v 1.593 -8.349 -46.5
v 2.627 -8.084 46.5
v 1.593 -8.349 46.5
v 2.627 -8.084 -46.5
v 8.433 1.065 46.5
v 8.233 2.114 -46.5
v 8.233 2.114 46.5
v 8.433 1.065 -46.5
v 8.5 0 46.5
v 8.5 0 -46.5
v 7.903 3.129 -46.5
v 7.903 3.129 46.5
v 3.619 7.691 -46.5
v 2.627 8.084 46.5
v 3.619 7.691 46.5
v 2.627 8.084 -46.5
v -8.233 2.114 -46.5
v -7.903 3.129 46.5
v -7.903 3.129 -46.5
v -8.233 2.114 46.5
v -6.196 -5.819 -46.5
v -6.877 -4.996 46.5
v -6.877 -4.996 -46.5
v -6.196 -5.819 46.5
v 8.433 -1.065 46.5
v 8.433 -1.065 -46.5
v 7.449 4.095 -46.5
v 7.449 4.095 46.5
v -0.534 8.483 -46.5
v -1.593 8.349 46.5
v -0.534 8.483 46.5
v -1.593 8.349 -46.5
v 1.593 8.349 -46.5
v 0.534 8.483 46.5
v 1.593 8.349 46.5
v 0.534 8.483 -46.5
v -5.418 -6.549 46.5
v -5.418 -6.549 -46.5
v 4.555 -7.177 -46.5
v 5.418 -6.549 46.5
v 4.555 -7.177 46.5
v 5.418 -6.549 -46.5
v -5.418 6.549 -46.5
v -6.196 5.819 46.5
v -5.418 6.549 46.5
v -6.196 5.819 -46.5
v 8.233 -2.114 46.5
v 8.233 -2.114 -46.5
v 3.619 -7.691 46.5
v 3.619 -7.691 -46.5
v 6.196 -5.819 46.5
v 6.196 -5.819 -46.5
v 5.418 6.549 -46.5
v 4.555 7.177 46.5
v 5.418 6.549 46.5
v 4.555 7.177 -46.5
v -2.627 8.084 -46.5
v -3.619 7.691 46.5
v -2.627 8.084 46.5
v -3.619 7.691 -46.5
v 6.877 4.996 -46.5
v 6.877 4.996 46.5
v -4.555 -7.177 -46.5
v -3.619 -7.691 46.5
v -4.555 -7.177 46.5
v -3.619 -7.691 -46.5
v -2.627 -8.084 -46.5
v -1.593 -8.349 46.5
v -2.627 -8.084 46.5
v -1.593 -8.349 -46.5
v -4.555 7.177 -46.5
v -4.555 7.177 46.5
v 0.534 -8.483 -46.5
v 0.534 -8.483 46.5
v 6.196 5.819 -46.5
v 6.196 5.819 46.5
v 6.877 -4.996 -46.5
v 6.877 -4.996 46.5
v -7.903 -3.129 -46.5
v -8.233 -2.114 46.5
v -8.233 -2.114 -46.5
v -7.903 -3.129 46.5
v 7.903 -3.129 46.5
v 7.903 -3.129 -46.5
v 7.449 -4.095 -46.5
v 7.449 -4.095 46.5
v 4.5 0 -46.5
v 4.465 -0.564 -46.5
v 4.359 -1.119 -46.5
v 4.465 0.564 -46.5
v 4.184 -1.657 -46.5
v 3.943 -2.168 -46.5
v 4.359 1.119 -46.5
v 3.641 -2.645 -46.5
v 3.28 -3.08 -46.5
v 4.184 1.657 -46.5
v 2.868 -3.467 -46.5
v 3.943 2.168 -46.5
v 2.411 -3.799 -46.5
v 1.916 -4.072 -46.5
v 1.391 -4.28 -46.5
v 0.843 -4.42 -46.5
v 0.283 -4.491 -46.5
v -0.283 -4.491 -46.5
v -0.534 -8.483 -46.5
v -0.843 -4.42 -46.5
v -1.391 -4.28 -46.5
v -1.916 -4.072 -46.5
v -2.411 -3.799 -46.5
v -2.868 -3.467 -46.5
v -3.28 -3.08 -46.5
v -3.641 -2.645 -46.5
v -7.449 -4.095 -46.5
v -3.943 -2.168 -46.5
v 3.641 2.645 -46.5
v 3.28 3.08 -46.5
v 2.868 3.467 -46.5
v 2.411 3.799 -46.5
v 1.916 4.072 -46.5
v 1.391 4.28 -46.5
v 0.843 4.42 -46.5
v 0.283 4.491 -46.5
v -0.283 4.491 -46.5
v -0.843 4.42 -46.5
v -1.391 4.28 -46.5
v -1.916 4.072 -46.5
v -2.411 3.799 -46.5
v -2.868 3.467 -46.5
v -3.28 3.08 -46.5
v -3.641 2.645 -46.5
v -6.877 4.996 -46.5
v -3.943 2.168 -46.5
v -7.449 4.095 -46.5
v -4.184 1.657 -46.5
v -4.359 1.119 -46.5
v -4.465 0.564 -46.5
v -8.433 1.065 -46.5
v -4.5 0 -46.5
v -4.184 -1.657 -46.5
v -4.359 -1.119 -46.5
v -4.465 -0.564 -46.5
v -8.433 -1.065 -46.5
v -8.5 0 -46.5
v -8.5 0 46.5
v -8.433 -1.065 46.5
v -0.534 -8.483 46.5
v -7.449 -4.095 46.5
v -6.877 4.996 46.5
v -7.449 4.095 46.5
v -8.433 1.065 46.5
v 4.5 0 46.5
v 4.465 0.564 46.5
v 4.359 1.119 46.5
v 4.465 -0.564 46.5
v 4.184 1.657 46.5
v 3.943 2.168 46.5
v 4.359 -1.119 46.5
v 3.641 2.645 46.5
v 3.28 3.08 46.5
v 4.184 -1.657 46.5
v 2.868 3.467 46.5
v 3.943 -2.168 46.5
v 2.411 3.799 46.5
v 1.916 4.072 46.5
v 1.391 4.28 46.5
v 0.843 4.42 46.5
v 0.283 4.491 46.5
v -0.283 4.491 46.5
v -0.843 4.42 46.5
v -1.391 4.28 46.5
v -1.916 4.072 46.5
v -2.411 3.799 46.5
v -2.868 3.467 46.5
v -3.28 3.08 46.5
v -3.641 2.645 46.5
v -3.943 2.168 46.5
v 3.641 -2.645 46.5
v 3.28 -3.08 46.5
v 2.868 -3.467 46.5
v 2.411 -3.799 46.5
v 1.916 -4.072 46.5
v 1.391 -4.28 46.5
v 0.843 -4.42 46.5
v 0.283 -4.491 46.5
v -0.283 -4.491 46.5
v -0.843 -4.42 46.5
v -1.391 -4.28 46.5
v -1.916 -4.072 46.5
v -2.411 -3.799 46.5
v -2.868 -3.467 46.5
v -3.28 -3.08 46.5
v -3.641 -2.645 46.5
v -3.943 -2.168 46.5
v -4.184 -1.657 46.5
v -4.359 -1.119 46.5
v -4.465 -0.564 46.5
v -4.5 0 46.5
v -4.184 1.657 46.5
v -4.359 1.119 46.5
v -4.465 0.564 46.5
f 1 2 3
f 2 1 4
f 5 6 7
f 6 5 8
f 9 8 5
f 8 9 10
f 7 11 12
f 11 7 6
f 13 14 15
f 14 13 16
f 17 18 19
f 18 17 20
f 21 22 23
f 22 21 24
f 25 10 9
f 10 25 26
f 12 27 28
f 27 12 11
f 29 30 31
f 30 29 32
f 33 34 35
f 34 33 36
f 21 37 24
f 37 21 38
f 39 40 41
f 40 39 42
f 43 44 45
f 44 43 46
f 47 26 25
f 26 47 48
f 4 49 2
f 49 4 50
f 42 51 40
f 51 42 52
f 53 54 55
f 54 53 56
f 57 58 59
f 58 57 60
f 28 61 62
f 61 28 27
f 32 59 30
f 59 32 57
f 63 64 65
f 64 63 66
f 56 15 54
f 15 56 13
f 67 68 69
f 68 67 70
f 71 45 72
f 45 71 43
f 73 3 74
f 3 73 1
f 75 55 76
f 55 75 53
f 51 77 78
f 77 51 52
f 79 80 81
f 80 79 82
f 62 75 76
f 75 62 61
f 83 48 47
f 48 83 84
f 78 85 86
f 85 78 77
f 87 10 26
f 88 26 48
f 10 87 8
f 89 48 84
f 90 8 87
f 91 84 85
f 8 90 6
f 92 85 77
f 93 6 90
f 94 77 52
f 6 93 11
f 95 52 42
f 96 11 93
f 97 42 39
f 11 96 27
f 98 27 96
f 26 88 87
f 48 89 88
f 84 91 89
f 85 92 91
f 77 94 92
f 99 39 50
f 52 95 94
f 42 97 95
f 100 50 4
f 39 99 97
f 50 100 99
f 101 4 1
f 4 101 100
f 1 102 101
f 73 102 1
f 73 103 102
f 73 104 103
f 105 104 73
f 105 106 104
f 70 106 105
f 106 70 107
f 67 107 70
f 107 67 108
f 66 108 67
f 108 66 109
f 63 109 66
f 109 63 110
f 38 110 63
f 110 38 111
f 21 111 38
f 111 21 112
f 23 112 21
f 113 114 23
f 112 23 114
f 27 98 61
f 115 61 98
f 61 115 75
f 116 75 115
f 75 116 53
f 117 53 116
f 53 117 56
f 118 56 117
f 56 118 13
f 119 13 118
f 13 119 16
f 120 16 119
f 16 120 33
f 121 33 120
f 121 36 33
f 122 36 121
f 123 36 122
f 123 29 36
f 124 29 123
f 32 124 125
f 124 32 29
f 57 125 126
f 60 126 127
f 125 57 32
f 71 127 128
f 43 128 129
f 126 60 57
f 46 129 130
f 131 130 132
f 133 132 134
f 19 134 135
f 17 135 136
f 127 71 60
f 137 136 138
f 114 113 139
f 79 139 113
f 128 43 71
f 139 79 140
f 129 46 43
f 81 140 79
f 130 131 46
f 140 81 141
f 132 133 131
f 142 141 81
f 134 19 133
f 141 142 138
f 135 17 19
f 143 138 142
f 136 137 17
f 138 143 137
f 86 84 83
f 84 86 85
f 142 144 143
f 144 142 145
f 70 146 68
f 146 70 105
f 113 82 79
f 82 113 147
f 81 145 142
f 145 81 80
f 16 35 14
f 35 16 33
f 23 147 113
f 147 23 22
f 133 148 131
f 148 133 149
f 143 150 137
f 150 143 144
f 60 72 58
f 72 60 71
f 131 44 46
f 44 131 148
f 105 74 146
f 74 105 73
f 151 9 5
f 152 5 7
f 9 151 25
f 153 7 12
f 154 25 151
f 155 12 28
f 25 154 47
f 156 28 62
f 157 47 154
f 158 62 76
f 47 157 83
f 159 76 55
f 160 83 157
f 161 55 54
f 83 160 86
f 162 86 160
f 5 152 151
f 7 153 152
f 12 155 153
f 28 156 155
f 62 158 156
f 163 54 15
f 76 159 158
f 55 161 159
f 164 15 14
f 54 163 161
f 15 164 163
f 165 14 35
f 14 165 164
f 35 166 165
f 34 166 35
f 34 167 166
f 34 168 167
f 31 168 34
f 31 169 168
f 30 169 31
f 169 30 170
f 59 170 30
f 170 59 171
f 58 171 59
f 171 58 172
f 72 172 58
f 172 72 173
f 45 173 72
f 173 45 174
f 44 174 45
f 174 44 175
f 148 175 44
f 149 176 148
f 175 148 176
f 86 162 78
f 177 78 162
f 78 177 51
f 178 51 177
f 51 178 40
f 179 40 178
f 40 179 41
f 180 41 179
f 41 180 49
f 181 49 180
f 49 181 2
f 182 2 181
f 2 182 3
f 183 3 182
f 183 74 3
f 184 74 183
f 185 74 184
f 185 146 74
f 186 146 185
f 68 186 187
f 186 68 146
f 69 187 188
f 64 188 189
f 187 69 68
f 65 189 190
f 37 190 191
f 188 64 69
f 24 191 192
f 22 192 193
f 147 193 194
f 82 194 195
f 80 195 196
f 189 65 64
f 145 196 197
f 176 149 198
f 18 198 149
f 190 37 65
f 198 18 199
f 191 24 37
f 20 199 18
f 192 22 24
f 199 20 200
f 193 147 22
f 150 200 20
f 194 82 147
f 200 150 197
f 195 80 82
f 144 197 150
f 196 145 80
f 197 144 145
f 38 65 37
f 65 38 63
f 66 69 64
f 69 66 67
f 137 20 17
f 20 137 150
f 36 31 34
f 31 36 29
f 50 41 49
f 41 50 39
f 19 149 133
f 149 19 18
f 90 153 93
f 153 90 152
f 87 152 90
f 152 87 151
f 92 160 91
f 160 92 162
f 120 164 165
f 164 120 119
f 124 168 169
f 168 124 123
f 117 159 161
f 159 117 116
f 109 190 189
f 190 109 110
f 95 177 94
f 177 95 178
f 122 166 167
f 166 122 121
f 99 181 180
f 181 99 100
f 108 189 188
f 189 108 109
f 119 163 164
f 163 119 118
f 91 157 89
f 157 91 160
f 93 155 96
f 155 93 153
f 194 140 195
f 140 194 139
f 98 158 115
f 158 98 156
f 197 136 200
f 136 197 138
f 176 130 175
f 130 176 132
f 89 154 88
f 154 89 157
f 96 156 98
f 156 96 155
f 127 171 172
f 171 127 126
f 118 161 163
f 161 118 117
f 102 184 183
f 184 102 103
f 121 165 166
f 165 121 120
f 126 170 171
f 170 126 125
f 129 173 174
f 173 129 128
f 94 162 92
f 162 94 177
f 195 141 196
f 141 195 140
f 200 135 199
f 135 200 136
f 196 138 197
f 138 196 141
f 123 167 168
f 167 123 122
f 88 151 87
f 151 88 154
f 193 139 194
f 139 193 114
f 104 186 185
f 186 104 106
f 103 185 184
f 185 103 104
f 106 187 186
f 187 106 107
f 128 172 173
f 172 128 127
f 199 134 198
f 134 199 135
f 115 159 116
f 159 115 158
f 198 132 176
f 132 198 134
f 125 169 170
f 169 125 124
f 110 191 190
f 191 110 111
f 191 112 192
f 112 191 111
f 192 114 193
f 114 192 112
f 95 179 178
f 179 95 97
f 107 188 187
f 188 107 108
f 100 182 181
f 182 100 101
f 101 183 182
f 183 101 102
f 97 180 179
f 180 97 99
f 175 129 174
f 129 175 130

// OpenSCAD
$fn = 50;


difference() {
	union() {
		translate(v = [0, 0, -46.5000000000]) {
			cylinder(h = 93, r = 8.5000000000);
		}
	}
	union() {
		translate(v = [0, 0, -100.0000000000]) {
			cylinder(h = 200, r = 4.5000000000);
		}
	}
}
